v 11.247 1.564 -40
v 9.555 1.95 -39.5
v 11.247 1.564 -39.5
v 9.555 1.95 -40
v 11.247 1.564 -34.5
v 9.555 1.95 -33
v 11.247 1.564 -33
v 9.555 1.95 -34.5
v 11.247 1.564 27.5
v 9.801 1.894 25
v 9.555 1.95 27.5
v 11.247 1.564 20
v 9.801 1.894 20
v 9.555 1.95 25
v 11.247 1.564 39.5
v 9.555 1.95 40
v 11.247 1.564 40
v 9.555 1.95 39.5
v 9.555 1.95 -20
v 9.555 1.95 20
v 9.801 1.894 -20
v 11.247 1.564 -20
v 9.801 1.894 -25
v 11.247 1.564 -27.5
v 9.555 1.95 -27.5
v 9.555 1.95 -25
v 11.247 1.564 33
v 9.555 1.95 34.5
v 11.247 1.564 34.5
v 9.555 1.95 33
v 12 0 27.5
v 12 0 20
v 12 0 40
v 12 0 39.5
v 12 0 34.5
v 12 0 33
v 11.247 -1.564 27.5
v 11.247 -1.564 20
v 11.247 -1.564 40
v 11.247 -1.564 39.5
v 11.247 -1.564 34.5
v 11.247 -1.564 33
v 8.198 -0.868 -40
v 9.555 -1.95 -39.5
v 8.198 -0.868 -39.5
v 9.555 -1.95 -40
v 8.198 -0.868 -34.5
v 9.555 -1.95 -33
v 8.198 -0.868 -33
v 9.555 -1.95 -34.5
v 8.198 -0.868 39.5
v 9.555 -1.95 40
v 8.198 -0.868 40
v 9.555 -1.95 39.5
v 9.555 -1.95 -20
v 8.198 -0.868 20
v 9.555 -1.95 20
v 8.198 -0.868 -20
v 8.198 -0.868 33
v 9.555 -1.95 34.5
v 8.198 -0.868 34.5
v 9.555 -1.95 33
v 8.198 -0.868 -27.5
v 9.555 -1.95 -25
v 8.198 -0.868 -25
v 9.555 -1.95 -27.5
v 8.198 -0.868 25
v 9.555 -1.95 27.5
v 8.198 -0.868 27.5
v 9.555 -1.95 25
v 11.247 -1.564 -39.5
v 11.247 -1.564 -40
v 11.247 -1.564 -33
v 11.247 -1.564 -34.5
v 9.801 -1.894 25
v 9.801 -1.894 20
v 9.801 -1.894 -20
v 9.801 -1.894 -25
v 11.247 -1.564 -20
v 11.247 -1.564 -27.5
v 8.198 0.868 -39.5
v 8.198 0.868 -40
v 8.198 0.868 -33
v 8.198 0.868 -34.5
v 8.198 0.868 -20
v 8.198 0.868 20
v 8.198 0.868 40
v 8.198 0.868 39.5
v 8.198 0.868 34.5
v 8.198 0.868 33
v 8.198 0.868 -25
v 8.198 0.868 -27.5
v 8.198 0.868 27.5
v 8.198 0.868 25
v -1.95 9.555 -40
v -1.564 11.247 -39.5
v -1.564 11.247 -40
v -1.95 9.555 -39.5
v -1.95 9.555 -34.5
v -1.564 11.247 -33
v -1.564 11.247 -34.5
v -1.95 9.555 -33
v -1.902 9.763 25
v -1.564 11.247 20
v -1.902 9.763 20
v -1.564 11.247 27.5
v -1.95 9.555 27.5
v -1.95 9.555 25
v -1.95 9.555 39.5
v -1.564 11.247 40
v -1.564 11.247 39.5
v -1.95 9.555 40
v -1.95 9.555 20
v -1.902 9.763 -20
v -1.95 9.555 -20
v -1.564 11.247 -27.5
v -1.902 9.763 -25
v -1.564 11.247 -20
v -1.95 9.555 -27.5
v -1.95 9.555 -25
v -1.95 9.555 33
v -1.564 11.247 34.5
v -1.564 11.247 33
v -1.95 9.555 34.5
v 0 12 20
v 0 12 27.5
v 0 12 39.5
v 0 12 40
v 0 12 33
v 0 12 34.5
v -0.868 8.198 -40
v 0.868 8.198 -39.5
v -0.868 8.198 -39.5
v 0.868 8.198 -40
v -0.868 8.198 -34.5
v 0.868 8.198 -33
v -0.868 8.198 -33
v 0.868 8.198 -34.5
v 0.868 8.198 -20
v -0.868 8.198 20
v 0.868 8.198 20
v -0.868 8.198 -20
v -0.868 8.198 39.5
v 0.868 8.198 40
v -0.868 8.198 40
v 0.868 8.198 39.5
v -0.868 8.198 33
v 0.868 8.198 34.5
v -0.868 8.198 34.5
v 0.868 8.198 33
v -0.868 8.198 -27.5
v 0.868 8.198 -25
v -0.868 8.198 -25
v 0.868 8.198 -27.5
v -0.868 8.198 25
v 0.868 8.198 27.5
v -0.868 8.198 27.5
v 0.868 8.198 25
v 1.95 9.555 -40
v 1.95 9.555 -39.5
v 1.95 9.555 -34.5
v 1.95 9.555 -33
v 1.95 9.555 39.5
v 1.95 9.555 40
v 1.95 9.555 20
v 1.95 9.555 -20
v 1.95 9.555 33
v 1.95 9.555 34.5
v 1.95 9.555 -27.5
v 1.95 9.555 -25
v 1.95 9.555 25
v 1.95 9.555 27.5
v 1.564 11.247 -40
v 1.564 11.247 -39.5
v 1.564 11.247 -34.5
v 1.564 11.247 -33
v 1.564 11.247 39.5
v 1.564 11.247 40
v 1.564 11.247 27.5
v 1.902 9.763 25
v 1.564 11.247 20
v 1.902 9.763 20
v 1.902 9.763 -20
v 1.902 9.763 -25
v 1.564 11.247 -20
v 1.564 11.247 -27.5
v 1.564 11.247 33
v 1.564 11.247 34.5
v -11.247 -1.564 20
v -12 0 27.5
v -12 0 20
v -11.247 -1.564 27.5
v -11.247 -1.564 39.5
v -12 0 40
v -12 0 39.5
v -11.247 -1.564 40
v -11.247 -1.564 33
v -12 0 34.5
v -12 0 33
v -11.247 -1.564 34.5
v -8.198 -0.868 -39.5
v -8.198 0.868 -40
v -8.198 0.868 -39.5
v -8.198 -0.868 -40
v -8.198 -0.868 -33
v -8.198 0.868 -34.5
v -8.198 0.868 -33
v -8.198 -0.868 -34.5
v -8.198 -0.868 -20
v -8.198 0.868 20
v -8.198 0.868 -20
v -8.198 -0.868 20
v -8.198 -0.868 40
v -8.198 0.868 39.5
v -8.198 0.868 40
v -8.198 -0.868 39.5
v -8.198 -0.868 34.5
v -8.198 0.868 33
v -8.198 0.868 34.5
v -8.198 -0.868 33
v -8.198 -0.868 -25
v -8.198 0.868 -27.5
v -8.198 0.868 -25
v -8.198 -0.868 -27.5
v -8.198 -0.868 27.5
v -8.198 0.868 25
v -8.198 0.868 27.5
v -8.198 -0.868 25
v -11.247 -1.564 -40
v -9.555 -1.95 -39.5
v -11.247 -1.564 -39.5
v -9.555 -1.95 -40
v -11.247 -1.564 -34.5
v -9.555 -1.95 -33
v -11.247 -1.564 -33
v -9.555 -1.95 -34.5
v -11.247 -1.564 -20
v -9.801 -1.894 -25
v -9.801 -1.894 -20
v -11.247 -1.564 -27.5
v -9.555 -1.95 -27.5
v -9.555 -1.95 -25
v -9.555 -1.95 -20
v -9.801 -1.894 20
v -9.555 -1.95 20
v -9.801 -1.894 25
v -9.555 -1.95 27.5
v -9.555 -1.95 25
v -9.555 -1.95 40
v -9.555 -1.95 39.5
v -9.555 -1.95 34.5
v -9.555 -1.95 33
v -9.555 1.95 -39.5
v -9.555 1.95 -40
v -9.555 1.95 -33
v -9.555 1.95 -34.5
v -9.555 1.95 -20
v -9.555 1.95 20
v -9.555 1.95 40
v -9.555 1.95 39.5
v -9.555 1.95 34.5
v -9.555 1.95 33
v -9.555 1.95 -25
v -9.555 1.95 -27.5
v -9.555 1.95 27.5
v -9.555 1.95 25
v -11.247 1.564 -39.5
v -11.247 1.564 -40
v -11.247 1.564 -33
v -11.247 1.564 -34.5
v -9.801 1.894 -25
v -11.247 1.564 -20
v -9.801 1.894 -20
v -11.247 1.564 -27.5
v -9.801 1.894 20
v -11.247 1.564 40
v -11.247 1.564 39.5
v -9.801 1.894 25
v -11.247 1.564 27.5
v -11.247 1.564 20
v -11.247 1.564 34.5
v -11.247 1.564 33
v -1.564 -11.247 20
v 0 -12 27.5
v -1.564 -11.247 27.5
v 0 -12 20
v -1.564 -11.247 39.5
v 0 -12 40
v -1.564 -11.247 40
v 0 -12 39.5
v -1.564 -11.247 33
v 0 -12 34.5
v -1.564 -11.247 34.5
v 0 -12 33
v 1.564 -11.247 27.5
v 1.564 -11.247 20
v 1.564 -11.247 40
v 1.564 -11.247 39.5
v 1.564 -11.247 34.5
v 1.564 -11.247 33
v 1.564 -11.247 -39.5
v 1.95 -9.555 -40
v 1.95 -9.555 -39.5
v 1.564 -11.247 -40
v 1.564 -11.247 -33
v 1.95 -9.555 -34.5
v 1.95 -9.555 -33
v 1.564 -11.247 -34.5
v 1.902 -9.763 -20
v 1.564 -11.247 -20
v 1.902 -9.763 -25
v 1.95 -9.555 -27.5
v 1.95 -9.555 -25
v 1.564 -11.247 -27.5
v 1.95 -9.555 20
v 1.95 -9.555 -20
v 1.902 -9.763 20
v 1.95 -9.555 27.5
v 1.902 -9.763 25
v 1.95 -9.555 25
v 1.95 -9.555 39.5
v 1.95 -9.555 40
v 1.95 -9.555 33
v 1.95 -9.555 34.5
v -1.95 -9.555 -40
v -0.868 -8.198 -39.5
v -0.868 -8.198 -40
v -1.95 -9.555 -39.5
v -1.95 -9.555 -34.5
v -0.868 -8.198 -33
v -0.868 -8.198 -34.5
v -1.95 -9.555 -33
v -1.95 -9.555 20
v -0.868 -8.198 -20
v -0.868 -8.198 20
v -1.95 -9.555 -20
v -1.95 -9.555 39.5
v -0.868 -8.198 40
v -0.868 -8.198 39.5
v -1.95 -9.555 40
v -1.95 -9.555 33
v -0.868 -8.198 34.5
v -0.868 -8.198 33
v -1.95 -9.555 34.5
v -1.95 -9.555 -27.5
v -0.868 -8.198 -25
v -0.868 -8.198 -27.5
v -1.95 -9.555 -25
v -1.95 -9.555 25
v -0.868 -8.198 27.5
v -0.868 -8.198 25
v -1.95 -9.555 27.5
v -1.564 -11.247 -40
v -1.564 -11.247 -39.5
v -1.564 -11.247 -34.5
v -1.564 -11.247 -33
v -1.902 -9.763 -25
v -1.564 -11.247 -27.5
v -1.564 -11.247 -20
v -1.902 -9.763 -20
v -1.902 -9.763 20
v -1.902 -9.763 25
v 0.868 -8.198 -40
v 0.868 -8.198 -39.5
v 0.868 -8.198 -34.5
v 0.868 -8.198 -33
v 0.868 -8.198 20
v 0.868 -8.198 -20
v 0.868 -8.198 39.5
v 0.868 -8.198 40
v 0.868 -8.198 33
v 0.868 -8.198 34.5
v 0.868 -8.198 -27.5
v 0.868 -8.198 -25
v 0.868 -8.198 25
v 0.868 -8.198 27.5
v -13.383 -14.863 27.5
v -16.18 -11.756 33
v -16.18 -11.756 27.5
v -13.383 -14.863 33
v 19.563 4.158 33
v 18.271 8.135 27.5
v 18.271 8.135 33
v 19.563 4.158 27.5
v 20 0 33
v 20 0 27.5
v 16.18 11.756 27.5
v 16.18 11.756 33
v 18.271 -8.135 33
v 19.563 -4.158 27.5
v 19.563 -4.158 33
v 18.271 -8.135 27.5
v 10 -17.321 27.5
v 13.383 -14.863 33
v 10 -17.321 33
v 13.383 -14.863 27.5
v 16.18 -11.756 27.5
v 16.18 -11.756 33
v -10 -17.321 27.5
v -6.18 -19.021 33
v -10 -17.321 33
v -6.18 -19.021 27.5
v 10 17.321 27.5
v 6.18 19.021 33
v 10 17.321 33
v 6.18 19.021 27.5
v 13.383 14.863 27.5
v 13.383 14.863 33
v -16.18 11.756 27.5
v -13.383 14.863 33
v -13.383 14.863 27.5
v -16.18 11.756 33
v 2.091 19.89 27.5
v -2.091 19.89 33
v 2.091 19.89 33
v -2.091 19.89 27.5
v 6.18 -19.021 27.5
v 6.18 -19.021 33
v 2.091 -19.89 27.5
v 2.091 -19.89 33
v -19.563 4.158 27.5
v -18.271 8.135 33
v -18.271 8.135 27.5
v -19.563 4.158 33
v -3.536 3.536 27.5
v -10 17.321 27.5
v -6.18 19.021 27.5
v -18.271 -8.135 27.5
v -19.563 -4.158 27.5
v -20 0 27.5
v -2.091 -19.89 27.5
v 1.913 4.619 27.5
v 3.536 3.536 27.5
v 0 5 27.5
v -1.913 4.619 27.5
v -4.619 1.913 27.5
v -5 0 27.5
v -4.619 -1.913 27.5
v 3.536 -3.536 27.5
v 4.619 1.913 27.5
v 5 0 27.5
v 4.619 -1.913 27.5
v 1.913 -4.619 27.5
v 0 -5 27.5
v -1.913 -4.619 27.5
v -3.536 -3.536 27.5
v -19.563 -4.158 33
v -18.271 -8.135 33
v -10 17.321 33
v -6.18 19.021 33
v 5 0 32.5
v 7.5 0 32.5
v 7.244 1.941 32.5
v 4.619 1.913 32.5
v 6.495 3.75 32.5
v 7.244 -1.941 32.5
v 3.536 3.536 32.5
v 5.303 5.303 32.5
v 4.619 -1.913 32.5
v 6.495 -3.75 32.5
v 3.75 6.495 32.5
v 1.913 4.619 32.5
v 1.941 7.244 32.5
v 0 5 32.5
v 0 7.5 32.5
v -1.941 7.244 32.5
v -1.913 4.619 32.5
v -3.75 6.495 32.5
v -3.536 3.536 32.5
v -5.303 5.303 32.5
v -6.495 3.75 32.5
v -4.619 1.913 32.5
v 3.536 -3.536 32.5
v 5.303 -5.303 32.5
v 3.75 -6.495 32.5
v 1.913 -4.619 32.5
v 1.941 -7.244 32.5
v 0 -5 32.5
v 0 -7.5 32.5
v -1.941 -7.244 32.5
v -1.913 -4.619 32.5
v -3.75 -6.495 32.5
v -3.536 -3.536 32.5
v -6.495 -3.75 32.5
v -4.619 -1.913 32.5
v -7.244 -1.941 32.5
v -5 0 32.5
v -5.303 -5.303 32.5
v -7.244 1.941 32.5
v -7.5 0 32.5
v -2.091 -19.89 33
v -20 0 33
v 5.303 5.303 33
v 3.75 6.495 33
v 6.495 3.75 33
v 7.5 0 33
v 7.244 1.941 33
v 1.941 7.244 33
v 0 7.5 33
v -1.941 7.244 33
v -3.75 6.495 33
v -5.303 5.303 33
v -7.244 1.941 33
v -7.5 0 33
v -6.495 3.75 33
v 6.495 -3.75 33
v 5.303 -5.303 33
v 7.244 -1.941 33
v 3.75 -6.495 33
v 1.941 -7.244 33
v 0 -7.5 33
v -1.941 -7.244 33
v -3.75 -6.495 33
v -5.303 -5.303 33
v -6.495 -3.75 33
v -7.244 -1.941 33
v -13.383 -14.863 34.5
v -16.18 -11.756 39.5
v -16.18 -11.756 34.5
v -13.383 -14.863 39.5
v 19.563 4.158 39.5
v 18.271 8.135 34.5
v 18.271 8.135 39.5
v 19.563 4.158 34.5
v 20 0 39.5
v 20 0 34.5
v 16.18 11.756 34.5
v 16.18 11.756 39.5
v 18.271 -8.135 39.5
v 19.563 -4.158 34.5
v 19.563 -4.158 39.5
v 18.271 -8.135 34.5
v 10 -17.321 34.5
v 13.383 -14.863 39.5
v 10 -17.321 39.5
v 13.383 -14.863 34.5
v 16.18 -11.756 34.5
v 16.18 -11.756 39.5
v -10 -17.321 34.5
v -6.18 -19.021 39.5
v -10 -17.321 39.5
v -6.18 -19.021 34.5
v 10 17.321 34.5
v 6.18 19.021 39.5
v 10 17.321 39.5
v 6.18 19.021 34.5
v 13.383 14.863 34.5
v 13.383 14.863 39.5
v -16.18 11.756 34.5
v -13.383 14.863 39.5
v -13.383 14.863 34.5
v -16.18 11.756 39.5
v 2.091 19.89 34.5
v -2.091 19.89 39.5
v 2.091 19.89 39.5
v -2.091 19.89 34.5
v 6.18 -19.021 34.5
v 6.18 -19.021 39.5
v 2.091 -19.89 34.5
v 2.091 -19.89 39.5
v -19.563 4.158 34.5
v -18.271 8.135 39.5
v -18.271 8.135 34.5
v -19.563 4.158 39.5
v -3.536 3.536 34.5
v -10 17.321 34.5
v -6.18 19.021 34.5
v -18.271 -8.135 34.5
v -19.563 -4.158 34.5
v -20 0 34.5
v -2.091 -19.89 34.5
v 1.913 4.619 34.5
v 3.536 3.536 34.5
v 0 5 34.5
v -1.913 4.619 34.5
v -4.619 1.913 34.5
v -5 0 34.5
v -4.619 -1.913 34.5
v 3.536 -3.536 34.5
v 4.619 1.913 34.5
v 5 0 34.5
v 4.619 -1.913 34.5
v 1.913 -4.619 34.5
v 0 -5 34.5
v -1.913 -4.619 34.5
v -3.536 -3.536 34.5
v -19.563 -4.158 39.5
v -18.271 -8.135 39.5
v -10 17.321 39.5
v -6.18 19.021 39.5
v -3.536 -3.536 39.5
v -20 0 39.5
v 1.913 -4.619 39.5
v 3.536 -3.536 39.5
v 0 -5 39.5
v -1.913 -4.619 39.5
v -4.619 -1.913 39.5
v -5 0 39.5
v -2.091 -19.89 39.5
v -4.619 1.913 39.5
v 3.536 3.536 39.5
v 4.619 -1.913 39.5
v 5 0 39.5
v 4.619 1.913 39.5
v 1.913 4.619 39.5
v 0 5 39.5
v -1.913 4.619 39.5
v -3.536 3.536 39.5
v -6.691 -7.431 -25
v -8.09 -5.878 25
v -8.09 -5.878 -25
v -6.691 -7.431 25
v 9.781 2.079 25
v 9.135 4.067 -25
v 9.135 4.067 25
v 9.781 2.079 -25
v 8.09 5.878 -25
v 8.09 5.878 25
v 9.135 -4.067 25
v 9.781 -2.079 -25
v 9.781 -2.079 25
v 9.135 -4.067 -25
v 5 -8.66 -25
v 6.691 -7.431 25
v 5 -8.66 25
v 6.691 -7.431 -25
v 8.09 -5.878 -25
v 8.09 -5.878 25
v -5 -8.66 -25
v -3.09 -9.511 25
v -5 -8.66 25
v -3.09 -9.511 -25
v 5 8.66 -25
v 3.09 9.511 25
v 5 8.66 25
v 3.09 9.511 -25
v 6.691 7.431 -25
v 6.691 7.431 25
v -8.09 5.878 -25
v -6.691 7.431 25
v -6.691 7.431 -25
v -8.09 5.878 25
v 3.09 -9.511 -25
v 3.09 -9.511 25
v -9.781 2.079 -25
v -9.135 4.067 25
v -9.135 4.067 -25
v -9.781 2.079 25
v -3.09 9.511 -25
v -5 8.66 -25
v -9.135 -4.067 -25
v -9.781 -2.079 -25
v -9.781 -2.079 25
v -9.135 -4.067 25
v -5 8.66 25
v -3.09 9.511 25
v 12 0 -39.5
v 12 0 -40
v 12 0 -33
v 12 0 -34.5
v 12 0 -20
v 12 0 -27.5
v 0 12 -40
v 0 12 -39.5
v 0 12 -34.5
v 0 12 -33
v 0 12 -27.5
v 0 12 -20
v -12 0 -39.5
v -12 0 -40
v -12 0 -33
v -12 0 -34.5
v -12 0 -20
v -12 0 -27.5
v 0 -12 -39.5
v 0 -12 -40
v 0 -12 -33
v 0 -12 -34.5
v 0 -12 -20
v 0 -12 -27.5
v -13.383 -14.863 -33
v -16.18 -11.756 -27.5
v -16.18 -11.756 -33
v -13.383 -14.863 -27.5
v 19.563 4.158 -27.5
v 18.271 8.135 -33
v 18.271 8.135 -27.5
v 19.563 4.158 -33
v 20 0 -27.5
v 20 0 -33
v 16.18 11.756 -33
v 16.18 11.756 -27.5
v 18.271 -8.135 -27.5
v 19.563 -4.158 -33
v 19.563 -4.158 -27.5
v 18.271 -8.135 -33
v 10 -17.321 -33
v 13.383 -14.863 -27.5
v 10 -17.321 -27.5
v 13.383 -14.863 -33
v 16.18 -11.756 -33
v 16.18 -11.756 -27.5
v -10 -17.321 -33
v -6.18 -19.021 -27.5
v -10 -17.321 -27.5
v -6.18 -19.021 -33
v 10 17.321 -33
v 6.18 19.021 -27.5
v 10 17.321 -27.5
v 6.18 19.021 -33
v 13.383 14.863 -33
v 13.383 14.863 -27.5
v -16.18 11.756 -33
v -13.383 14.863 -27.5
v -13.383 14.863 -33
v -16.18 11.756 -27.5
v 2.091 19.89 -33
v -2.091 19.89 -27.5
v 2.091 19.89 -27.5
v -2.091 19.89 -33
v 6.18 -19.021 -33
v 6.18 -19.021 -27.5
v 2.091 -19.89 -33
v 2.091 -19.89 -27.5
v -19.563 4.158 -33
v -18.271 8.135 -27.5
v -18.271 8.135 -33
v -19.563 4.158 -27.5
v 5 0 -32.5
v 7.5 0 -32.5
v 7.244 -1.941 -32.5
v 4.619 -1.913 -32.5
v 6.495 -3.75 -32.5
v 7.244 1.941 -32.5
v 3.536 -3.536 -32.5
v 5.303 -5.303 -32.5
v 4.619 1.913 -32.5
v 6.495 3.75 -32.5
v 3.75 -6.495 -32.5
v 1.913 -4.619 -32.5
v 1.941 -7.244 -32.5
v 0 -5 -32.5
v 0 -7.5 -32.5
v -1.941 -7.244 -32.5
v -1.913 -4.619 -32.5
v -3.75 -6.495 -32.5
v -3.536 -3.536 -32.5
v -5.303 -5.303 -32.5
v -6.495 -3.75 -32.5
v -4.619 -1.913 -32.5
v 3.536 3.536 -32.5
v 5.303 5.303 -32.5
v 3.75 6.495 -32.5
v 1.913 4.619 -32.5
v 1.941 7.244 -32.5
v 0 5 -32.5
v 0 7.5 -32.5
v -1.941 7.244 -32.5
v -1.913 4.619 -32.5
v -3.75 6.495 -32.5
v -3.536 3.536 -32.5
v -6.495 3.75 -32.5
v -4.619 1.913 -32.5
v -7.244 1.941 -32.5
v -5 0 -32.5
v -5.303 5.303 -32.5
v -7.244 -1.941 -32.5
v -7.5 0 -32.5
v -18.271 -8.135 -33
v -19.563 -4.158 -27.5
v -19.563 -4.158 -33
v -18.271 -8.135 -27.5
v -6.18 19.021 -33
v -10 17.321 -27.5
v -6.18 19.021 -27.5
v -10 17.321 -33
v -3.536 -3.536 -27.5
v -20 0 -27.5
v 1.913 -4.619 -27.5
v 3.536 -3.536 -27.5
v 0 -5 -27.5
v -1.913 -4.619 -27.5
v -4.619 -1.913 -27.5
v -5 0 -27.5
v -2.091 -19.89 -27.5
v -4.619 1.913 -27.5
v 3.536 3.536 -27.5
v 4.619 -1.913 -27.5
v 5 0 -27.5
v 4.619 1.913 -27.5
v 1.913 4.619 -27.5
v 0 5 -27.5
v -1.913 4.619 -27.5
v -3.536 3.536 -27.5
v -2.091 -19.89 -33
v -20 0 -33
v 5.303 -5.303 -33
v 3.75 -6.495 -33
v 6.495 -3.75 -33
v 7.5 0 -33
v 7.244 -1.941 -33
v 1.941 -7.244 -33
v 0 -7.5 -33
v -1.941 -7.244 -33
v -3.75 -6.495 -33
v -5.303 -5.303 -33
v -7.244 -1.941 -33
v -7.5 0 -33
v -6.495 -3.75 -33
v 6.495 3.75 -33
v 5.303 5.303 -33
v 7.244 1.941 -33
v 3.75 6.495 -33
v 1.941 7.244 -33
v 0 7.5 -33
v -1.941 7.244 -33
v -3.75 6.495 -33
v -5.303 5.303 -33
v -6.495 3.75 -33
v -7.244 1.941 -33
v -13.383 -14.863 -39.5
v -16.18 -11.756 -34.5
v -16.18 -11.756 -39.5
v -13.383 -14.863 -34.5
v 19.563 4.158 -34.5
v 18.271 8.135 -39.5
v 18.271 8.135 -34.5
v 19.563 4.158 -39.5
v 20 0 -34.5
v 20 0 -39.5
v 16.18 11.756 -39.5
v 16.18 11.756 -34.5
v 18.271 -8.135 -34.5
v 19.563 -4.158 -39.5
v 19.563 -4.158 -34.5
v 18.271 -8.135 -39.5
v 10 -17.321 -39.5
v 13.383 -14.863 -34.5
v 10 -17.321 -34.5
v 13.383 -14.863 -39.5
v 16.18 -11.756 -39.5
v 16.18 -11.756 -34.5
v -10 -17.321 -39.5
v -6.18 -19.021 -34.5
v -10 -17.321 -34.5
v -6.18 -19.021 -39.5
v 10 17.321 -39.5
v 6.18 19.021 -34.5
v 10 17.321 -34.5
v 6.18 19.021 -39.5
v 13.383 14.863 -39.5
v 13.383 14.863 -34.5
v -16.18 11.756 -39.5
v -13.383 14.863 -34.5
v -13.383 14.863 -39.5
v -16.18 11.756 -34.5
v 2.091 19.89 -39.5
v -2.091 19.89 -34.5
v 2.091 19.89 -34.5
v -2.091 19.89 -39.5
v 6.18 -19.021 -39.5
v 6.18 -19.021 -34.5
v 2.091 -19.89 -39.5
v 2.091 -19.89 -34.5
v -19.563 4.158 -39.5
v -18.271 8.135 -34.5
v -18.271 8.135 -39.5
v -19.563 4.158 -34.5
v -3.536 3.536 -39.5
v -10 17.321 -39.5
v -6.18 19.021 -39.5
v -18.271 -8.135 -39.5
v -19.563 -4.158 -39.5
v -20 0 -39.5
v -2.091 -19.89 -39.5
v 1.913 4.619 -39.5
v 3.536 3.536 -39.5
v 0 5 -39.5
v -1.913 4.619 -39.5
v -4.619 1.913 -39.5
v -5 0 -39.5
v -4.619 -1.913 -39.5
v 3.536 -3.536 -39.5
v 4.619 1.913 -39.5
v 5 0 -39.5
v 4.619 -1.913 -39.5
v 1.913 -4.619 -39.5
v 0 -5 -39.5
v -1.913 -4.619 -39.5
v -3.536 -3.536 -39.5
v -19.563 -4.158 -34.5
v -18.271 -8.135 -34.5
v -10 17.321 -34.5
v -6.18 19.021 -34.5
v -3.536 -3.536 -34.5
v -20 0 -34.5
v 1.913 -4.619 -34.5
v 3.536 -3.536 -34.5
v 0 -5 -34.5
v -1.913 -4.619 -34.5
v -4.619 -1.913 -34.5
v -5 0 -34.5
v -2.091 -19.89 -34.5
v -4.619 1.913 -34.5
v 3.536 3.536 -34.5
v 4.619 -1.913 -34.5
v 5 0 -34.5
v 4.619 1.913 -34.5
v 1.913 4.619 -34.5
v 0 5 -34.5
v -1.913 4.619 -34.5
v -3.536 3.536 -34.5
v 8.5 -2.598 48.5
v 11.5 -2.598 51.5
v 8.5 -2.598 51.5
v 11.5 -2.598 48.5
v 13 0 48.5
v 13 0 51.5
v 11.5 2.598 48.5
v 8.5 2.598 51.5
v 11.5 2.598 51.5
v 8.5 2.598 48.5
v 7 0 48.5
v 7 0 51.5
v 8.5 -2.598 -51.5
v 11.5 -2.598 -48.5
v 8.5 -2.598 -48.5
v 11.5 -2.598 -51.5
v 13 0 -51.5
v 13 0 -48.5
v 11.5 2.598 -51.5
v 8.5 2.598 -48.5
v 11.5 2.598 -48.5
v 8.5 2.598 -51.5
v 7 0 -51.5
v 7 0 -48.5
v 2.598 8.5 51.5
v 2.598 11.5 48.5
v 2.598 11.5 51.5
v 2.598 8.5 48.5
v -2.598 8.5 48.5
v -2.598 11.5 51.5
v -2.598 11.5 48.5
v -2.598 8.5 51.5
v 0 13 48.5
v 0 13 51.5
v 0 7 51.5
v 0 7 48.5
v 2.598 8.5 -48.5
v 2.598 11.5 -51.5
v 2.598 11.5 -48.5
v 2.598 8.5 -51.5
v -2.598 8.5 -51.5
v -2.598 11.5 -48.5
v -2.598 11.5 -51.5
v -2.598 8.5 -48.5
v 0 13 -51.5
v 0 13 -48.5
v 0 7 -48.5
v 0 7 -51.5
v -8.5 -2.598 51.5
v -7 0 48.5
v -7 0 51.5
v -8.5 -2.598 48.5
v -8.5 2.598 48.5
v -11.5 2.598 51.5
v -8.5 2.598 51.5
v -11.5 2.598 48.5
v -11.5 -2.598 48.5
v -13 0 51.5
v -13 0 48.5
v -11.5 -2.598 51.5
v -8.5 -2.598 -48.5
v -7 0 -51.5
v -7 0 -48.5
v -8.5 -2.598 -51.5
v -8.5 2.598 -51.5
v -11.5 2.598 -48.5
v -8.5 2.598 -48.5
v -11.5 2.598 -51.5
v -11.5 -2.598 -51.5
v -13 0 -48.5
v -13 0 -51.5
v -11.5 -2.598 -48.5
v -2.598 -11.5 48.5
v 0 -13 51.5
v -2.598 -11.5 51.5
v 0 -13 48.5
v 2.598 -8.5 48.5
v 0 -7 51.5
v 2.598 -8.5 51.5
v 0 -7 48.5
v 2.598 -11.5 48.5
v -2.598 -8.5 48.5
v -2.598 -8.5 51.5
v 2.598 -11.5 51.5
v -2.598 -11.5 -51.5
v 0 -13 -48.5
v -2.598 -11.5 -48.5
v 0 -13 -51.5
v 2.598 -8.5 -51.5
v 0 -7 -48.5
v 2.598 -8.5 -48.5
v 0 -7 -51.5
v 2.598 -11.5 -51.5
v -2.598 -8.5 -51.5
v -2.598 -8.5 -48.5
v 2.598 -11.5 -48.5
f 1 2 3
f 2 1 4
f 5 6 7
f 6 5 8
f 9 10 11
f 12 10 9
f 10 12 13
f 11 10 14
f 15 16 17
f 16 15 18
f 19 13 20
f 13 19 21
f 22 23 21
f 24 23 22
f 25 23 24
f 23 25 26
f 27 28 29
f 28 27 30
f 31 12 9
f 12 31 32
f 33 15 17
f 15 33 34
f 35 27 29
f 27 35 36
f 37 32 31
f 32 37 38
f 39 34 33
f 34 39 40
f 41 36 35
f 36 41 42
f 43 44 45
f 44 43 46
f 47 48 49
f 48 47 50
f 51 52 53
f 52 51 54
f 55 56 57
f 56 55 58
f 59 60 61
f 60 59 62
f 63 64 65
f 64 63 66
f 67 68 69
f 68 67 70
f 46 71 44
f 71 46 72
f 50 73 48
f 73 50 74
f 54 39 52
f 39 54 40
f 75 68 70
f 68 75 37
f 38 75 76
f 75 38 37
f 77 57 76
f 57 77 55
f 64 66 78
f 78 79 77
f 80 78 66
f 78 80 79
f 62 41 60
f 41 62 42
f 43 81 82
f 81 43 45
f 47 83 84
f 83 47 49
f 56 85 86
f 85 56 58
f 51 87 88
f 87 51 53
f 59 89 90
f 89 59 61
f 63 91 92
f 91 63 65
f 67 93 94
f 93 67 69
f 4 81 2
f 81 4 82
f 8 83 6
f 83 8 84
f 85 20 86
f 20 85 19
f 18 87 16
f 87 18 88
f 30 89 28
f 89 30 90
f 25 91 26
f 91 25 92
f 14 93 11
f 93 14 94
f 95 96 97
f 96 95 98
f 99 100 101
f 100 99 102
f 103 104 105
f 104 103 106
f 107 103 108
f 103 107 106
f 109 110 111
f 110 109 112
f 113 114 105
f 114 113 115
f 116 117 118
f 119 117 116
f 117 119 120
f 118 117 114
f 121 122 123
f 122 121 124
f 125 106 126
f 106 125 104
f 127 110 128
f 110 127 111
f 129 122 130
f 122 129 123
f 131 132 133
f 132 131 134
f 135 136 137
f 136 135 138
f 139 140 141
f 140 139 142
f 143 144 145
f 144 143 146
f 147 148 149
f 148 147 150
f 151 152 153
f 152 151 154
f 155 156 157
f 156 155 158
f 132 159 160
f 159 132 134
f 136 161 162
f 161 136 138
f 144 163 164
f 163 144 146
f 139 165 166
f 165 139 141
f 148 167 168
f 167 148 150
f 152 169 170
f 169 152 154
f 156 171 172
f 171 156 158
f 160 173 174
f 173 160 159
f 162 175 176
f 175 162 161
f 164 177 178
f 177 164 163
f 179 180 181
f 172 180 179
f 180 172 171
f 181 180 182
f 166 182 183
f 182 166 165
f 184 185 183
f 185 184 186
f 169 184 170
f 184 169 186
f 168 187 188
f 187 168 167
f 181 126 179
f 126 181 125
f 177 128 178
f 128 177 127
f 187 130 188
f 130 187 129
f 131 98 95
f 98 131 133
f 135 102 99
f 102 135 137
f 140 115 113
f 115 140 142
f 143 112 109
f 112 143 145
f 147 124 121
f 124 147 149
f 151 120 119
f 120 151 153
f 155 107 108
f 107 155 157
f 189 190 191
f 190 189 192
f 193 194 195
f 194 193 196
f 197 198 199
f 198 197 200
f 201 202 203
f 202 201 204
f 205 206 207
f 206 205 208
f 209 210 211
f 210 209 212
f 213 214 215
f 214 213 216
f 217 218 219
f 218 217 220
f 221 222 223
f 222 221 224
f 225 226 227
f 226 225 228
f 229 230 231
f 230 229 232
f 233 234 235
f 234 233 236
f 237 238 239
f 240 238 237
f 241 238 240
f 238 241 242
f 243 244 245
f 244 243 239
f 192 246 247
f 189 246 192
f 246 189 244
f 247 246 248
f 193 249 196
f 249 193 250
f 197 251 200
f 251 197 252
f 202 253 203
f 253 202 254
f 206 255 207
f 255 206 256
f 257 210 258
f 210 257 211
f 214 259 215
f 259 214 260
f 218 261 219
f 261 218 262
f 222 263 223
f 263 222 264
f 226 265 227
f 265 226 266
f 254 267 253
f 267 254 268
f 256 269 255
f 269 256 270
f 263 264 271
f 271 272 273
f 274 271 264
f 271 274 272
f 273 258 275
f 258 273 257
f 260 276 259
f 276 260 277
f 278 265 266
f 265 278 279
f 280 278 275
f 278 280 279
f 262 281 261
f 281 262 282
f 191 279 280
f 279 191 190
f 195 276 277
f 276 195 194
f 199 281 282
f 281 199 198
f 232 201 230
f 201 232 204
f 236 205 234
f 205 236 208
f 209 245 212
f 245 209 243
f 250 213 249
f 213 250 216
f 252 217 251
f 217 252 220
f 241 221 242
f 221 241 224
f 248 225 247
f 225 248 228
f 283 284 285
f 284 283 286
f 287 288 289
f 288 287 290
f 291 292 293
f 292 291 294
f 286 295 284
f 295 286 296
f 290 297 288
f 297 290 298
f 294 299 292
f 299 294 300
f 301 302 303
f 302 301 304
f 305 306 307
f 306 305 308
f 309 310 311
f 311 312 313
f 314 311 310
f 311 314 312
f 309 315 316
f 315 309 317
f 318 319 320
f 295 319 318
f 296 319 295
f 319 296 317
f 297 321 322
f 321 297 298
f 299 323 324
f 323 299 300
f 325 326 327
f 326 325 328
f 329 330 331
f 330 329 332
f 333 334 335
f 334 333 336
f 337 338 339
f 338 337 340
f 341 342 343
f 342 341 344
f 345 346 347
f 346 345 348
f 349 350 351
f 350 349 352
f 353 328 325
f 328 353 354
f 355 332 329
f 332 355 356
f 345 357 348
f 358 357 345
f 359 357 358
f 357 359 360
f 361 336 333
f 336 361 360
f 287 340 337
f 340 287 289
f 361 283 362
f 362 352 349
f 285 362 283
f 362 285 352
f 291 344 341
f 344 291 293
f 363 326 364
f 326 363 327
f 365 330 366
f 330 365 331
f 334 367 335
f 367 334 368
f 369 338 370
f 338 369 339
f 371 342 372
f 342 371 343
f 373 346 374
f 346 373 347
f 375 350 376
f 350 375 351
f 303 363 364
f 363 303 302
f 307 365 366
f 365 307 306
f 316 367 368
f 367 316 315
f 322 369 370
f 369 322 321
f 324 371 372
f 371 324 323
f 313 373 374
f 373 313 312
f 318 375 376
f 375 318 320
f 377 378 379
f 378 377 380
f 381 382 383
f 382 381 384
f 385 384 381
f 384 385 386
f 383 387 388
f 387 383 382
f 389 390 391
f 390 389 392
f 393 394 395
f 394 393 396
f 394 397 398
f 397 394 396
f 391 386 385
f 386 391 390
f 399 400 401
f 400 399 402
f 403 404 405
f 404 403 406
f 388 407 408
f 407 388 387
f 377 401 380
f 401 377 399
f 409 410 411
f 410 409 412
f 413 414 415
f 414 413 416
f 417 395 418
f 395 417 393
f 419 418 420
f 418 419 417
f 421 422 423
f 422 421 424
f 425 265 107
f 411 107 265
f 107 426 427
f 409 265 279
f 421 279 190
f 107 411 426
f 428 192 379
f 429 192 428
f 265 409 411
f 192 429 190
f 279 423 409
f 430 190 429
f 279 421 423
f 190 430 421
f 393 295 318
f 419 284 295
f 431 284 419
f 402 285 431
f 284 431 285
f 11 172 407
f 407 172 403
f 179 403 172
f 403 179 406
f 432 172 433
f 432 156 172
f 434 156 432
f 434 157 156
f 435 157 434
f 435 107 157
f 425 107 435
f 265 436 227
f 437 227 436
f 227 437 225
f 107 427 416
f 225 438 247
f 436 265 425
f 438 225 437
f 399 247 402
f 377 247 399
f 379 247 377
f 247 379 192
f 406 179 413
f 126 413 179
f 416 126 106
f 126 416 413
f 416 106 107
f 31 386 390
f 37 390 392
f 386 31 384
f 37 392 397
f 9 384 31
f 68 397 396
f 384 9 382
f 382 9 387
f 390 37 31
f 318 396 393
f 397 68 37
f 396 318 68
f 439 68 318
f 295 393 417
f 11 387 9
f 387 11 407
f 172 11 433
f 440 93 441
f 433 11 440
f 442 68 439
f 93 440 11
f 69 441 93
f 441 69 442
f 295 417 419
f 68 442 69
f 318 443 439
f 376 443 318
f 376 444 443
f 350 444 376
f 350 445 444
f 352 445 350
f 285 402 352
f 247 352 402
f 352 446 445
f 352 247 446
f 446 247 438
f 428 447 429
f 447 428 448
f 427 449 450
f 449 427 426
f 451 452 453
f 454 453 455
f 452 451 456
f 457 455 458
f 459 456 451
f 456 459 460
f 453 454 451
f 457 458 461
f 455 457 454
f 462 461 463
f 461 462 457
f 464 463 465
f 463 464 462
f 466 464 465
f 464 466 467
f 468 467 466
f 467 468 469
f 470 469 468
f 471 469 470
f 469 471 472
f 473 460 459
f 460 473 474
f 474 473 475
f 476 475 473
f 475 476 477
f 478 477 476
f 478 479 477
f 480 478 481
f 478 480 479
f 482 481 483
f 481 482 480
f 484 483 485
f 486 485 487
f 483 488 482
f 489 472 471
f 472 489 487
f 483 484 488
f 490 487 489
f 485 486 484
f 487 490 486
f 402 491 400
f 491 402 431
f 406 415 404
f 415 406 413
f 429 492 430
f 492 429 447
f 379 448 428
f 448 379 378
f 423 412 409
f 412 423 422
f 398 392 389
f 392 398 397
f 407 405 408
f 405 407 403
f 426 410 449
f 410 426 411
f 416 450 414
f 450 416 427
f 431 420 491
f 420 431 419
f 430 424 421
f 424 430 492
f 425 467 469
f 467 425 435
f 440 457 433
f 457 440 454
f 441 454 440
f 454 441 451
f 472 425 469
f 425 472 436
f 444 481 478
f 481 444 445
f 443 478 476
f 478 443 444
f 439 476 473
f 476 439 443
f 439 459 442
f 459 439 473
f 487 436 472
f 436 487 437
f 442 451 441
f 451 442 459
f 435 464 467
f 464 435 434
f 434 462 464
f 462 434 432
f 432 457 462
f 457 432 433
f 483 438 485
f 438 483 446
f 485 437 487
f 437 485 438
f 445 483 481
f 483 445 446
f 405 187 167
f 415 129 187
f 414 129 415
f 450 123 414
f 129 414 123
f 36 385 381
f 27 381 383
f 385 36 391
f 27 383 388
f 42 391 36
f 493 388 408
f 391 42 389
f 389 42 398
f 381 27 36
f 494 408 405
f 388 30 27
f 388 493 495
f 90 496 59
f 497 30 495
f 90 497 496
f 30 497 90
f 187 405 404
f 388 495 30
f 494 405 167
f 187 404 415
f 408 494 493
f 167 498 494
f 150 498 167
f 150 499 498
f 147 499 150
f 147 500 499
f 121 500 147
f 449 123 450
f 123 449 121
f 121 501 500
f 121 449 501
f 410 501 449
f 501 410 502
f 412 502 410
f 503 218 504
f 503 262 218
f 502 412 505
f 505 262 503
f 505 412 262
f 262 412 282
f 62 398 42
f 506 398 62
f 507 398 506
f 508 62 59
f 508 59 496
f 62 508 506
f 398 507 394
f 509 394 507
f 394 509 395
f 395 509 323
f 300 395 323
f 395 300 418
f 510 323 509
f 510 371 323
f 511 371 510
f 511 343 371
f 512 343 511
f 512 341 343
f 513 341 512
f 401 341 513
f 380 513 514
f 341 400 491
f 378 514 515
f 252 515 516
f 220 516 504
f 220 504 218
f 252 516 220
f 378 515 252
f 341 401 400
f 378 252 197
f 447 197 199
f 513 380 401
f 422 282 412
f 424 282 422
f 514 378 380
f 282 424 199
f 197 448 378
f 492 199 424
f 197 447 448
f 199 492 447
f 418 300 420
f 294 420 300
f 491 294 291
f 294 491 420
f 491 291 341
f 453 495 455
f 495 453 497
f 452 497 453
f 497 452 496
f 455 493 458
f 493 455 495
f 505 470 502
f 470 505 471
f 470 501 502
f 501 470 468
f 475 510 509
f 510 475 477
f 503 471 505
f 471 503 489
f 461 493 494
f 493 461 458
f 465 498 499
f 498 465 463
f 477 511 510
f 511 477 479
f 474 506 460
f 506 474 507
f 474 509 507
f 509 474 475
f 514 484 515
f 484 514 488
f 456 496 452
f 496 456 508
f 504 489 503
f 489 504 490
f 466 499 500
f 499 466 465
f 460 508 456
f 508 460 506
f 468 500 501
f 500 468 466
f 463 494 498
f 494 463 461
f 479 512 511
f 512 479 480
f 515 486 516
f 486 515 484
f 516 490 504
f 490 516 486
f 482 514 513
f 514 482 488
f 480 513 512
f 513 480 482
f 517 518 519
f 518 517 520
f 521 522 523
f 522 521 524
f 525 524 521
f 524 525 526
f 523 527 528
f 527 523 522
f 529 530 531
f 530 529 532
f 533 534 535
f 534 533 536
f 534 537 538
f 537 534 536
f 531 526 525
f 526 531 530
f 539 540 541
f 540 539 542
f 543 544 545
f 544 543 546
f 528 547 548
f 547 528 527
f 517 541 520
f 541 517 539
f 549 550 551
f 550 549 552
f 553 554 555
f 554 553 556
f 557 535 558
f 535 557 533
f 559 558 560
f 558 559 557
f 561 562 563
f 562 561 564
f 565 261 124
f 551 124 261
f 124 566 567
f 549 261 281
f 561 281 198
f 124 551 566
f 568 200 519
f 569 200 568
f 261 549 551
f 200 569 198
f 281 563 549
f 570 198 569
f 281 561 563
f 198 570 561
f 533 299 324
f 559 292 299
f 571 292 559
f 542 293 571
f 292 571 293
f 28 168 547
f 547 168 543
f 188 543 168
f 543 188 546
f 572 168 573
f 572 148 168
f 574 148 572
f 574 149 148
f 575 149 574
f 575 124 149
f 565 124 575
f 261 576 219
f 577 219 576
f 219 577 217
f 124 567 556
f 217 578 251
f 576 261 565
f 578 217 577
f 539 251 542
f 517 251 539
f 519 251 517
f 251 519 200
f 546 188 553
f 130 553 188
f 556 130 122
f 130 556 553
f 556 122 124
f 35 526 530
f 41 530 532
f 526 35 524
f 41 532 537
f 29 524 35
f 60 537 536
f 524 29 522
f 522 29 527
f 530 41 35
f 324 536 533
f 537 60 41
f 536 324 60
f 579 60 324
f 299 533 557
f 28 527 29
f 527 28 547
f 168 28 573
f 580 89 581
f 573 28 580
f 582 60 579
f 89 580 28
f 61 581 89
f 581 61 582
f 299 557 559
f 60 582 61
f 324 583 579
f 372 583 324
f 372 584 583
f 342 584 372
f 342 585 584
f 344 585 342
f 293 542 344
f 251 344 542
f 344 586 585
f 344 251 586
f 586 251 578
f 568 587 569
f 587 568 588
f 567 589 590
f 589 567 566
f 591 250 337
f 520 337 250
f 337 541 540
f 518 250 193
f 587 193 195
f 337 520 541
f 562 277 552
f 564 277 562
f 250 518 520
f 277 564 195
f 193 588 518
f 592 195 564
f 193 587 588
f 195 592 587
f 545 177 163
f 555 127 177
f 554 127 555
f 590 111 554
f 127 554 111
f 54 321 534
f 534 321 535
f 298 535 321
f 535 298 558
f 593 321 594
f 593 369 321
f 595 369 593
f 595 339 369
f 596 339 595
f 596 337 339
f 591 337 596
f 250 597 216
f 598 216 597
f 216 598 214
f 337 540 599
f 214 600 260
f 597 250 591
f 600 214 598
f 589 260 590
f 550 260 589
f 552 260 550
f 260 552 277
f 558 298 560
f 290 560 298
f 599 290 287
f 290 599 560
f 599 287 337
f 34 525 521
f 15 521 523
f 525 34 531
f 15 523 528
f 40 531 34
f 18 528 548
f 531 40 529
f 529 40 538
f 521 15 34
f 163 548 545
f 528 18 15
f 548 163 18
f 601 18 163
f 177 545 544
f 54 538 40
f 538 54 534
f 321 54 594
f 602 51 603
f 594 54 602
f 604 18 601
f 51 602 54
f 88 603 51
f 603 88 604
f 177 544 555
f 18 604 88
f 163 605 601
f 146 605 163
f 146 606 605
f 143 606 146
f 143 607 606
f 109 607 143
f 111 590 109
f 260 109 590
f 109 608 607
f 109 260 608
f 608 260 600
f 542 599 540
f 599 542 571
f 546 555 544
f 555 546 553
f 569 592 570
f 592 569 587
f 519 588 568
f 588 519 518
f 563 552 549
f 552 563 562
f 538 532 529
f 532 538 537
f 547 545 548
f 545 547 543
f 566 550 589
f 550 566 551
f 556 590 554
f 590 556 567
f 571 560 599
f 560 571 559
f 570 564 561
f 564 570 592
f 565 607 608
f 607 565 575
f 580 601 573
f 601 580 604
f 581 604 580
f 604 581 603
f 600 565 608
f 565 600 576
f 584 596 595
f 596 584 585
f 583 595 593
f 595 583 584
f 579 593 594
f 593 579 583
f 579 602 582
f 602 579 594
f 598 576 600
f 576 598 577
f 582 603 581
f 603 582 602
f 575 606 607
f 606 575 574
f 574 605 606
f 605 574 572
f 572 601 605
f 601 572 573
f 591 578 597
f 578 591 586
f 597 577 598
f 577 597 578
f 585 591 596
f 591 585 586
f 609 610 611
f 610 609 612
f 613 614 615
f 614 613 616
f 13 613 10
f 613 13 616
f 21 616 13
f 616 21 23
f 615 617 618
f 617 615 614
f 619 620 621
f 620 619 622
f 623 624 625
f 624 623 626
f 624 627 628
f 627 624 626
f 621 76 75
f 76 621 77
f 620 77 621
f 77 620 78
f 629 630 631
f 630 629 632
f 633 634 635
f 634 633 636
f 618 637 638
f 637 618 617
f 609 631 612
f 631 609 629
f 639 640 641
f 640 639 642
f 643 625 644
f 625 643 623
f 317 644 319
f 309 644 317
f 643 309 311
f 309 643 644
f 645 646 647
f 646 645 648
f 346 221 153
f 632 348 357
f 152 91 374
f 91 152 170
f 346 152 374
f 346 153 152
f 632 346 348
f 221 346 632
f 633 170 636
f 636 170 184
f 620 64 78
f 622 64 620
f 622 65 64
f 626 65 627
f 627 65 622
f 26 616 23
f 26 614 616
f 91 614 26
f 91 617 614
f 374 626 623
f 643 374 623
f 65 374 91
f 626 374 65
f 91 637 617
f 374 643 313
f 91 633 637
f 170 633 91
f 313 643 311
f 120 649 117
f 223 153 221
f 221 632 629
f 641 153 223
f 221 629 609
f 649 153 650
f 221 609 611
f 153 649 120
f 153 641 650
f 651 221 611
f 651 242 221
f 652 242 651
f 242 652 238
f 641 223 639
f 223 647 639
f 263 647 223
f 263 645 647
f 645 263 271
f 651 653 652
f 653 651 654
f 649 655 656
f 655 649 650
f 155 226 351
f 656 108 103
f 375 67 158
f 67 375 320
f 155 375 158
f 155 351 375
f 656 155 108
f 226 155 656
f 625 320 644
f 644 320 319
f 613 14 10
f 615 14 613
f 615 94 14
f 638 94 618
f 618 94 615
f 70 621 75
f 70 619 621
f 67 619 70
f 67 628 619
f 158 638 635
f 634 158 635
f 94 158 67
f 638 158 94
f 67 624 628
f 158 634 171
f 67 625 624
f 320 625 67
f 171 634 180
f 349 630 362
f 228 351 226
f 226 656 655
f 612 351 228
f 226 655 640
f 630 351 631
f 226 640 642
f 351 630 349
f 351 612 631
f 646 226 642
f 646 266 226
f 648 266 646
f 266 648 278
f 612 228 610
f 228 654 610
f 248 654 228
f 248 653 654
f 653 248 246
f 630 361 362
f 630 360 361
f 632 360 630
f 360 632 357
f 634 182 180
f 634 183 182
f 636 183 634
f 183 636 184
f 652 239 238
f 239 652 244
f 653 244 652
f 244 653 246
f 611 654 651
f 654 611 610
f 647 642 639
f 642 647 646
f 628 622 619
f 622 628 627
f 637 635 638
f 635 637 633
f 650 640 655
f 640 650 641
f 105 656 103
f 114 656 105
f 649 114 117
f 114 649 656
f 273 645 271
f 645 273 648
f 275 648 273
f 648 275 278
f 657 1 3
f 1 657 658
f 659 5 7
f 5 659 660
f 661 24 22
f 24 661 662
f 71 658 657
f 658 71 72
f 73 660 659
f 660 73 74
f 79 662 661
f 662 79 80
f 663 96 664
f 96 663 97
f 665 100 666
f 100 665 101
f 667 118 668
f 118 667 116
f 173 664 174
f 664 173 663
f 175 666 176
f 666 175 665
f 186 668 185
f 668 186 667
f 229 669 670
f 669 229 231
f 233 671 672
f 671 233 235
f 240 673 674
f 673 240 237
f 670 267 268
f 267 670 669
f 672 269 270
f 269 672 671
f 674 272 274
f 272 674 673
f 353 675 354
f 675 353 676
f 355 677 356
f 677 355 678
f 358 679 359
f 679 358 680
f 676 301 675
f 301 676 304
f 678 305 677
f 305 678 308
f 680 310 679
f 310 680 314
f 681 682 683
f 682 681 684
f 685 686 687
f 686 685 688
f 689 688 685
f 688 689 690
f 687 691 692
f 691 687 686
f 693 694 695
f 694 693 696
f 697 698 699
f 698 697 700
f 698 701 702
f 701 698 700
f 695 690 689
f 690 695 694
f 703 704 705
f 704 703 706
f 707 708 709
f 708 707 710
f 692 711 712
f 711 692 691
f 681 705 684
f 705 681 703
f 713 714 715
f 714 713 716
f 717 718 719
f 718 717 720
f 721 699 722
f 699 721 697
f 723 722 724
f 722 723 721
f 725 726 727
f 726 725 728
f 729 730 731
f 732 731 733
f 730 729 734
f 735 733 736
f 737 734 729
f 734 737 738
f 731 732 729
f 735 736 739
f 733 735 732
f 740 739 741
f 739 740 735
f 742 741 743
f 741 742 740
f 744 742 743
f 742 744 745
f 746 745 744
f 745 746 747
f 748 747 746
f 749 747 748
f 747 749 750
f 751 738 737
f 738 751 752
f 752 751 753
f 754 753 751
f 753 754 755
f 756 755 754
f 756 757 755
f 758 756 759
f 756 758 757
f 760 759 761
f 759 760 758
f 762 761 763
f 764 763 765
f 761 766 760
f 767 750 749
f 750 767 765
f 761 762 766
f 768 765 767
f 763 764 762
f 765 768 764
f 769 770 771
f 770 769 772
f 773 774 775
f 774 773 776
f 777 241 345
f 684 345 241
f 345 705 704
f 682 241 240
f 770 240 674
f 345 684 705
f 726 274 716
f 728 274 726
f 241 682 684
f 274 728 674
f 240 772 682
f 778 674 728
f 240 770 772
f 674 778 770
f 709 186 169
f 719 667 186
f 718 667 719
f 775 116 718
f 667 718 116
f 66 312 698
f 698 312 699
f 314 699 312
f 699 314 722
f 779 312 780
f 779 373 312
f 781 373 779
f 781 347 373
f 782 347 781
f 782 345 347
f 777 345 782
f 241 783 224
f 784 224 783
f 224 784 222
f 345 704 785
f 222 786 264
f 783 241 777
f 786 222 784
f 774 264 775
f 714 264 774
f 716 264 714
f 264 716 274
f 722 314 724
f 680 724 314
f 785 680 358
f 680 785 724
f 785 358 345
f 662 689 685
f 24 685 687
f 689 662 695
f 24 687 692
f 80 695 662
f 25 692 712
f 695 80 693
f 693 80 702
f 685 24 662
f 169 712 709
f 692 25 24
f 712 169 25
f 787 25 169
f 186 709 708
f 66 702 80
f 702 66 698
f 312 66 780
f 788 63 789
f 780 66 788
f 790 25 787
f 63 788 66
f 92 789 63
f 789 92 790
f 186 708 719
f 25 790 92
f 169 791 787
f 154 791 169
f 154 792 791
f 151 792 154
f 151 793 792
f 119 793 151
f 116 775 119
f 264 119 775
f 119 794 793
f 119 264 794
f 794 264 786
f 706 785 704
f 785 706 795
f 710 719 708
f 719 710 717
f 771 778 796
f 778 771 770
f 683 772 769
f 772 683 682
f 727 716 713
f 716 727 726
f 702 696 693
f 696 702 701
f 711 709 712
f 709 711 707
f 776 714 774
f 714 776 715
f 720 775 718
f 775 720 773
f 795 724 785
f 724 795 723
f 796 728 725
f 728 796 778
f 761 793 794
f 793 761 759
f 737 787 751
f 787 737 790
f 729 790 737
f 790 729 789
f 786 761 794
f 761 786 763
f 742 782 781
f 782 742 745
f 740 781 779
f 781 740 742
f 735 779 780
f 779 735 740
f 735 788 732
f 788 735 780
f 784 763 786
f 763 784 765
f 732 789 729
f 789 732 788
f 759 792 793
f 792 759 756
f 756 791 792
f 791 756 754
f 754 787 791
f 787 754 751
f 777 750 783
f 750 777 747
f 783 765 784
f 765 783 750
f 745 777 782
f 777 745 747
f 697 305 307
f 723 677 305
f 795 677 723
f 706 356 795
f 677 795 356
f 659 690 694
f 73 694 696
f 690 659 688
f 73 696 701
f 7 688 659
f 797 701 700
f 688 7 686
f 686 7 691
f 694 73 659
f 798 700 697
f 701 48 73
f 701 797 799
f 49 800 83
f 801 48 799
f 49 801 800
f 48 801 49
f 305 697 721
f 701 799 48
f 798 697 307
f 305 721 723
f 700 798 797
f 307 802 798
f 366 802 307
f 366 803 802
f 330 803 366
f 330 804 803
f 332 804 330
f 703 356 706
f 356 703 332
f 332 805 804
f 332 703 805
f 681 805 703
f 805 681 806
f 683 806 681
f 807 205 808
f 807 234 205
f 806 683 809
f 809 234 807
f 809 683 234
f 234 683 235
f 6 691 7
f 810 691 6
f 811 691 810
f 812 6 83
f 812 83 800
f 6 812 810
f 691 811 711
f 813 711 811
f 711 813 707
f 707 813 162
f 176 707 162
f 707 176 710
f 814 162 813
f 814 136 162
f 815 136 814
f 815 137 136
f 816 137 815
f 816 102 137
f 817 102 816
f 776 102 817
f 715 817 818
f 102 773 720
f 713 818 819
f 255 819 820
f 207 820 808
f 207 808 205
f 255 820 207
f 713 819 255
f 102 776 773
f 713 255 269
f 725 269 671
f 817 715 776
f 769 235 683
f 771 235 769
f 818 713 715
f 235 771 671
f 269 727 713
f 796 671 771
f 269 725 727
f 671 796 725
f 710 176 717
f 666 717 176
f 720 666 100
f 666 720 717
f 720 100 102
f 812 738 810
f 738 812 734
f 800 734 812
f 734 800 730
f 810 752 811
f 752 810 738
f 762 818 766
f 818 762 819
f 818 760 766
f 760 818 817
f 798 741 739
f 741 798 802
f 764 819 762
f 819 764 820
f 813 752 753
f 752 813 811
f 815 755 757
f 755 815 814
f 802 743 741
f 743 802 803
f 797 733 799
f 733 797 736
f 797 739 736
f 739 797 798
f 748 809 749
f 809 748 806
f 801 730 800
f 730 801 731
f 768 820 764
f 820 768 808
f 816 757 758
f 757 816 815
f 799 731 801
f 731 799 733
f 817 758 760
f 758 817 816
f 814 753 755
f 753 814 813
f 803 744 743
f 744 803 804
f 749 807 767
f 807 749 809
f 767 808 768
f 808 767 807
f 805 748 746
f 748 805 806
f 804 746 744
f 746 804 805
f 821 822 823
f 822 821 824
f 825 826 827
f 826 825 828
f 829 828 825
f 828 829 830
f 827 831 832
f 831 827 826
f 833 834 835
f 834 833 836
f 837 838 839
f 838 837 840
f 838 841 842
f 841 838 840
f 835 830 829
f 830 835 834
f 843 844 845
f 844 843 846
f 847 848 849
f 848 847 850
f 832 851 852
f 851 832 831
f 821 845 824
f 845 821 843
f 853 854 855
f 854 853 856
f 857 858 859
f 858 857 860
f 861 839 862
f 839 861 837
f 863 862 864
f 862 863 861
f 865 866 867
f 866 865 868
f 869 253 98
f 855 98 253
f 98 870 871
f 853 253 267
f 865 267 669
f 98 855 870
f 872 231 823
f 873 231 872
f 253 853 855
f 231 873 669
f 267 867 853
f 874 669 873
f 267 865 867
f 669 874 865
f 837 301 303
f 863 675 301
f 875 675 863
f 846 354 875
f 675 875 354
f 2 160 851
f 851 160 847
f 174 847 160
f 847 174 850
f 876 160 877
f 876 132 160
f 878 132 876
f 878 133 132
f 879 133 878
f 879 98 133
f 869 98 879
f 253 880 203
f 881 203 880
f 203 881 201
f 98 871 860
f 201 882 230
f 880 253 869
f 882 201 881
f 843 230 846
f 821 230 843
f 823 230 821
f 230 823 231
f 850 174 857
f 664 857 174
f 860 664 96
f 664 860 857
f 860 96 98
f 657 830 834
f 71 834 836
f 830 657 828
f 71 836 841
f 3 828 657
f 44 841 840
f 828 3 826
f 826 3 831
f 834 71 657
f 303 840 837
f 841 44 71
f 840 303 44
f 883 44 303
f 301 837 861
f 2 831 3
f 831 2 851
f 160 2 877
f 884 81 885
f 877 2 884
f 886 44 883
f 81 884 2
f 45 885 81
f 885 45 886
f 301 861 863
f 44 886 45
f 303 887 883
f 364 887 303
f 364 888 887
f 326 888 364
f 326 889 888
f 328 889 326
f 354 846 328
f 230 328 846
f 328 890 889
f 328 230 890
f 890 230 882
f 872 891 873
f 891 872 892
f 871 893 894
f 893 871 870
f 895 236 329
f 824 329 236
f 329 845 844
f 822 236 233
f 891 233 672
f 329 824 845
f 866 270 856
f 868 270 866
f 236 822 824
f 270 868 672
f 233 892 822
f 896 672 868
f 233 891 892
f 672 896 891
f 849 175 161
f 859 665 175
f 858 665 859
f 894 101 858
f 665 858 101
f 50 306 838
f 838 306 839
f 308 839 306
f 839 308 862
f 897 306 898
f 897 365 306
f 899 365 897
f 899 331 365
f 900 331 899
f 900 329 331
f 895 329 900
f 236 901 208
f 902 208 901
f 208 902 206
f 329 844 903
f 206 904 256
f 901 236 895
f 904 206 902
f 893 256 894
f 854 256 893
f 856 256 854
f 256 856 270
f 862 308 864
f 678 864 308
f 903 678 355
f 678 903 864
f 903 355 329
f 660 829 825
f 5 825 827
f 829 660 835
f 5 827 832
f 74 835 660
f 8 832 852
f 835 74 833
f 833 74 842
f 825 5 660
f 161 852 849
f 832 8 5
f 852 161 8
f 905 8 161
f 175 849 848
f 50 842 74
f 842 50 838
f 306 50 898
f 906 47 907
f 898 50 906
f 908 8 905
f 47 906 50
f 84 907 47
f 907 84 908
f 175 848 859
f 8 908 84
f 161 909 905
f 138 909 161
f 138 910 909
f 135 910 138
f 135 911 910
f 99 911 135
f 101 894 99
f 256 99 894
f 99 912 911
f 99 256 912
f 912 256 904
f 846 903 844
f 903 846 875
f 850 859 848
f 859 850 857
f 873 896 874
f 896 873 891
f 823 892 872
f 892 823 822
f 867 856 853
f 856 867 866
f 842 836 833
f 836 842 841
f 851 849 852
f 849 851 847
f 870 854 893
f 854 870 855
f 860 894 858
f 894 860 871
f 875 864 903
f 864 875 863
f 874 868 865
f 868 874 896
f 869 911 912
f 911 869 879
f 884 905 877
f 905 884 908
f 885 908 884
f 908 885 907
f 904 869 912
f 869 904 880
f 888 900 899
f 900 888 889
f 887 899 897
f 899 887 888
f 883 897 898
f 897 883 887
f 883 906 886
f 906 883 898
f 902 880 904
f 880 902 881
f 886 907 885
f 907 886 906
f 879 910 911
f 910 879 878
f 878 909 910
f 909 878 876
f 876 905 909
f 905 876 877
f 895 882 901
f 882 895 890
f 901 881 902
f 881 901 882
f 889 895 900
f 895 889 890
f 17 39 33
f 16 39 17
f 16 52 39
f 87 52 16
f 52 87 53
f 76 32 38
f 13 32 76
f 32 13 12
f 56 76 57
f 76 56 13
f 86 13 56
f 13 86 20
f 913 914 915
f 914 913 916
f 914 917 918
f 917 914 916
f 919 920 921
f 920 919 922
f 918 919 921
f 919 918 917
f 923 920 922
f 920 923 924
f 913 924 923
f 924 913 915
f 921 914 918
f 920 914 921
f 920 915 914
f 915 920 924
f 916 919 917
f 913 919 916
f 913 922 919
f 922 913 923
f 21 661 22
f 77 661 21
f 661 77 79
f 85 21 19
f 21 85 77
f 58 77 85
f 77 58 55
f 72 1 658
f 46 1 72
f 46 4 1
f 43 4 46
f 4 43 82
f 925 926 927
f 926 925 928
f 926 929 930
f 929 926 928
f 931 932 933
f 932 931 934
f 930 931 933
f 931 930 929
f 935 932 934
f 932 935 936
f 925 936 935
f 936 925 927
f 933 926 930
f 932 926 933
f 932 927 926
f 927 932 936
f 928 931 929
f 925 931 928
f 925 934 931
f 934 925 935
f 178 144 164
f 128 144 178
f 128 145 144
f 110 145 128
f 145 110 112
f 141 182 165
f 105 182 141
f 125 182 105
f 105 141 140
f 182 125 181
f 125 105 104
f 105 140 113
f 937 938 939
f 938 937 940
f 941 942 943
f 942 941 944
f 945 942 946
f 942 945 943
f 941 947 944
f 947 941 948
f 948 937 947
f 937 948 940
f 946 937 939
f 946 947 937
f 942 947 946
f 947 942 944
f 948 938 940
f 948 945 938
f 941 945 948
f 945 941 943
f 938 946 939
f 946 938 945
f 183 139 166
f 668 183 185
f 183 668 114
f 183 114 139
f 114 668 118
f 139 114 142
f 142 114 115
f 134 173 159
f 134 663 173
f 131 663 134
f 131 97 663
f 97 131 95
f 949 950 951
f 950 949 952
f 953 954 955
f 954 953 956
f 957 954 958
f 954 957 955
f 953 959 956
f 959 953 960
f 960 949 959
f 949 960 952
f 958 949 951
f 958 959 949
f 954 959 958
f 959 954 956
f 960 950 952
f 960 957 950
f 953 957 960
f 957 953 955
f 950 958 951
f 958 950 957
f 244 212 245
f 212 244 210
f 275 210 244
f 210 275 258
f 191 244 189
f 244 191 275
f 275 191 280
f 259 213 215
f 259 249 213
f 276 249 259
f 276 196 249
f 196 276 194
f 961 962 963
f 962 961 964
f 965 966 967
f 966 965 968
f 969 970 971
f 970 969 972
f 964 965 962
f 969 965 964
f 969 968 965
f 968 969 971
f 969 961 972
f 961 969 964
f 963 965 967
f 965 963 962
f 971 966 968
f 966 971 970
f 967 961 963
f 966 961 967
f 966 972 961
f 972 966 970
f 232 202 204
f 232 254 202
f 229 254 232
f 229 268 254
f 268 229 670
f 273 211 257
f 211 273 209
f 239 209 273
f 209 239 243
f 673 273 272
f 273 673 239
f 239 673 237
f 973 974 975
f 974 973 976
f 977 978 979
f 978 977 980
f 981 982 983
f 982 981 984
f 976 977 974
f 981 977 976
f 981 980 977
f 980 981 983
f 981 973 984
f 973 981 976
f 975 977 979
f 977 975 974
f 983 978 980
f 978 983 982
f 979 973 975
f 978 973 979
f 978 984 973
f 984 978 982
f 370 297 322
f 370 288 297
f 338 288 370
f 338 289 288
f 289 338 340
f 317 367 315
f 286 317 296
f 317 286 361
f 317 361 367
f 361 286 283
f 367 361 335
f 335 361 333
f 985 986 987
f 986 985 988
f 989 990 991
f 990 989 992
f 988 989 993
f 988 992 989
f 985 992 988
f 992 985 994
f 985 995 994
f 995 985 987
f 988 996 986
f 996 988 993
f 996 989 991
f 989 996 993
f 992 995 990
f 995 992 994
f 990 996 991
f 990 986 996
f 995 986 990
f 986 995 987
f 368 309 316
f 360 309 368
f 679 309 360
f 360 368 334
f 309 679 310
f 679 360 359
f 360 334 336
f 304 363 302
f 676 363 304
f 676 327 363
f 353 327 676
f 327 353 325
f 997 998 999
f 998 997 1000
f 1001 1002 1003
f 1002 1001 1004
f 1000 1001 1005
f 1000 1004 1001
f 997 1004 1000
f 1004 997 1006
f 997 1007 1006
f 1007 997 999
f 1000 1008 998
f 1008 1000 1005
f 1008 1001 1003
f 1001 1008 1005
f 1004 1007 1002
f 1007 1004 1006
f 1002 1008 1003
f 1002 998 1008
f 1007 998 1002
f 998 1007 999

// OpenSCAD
// Parameters
flange_diameter = 40;
flange_thickness = 5;
spacer_thickness = 2;
bolt_diameter = 4;
bolt_length = 20;
nut_diameter = 6;
nut_thickness = 3;
cylinder_diameter = 20;
cylinder_length = 50;
hole_spacing = 20;

// Function to create a flange plate
module flange_plate() {
    difference() {
        cylinder(d=flange_diameter, h=flange_thickness, center=true);
        cylinder(d=10, h=flange_thickness + 2, center=true);
        for (i = [0:3]) {
            rotate([0, 0, i * 90])
                translate([hole_spacing / 2, 0, 0])
                cylinder(d=bolt_diameter, h=flange_thickness + 2, center=true);
        }
    }
}

// Function to create a spacer ring
module spacer_ring() {
    difference() {
        cylinder(d=flange_diameter, h=spacer_thickness, center=true);
        cylinder(d=15, h=spacer_thickness + 2, center=true);
    }
}

// Function to create a bolt
module bolt() {
    cylinder(d=bolt_diameter, h=bolt_length, center=true);
}

// Function to create a nut
module nut() {
    cylinder(d=nut_diameter, h=nut_thickness, center=true, $fn=6);
}

// Function to create the central cylinder
module central_cylinder() {
    difference() {
        cylinder(d=cylinder_diameter, h=cylinder_length, center=true);
        for (i = [0:3]) {
            rotate([0, 0, i * 90])
                translate([hole_spacing / 2, 0, 0])
                cylinder(d=bolt_diameter, h=cylinder_length + 2, center=true);
        }
    }
}

// Assembly
module coupling() {
    translate([0, 0, cylinder_length / 2 + flange_thickness])
        flange_plate();
    
    translate([0, 0, cylinder_length / 2 + flange_thickness + spacer_thickness])
        spacer_ring();
    
    translate([0, 0, cylinder_length / 2 + 2 * flange_thickness + spacer_thickness])
        flange_plate();
    
    central_cylinder();
    
    translate([0, 0, -cylinder_length / 2 - flange_thickness])
        flange_plate();
    
    translate([0, 0, -cylinder_length / 2 - flange_thickness - spacer_thickness])
        spacer_ring();
    
    translate([0, 0, -cylinder_length / 2 - 2 * flange_thickness - spacer_thickness])
        flange_plate();
    
    for (i = [0:3]) {
        rotate([0, 0, i * 90])
            translate([hole_spacing / 2, 0, cylinder_length / 2 + flange_thickness])
                bolt();
        
        rotate([0, 0, i * 90])
            translate([hole_spacing / 2, 0, cylinder_length / 2 + flange_thickness + bolt_length])
                nut();
        
        rotate([0, 0, i * 90])
            translate([hole_spacing / 2, 0, -cylinder_length / 2 - flange_thickness])
                bolt();
        
        rotate([0, 0, i * 90])
            translate([hole_spacing / 2, 0, -cylinder_length / 2 - flange_thickness - bolt_length])
                nut();
    }
}

// Render the coupling
coupling();
